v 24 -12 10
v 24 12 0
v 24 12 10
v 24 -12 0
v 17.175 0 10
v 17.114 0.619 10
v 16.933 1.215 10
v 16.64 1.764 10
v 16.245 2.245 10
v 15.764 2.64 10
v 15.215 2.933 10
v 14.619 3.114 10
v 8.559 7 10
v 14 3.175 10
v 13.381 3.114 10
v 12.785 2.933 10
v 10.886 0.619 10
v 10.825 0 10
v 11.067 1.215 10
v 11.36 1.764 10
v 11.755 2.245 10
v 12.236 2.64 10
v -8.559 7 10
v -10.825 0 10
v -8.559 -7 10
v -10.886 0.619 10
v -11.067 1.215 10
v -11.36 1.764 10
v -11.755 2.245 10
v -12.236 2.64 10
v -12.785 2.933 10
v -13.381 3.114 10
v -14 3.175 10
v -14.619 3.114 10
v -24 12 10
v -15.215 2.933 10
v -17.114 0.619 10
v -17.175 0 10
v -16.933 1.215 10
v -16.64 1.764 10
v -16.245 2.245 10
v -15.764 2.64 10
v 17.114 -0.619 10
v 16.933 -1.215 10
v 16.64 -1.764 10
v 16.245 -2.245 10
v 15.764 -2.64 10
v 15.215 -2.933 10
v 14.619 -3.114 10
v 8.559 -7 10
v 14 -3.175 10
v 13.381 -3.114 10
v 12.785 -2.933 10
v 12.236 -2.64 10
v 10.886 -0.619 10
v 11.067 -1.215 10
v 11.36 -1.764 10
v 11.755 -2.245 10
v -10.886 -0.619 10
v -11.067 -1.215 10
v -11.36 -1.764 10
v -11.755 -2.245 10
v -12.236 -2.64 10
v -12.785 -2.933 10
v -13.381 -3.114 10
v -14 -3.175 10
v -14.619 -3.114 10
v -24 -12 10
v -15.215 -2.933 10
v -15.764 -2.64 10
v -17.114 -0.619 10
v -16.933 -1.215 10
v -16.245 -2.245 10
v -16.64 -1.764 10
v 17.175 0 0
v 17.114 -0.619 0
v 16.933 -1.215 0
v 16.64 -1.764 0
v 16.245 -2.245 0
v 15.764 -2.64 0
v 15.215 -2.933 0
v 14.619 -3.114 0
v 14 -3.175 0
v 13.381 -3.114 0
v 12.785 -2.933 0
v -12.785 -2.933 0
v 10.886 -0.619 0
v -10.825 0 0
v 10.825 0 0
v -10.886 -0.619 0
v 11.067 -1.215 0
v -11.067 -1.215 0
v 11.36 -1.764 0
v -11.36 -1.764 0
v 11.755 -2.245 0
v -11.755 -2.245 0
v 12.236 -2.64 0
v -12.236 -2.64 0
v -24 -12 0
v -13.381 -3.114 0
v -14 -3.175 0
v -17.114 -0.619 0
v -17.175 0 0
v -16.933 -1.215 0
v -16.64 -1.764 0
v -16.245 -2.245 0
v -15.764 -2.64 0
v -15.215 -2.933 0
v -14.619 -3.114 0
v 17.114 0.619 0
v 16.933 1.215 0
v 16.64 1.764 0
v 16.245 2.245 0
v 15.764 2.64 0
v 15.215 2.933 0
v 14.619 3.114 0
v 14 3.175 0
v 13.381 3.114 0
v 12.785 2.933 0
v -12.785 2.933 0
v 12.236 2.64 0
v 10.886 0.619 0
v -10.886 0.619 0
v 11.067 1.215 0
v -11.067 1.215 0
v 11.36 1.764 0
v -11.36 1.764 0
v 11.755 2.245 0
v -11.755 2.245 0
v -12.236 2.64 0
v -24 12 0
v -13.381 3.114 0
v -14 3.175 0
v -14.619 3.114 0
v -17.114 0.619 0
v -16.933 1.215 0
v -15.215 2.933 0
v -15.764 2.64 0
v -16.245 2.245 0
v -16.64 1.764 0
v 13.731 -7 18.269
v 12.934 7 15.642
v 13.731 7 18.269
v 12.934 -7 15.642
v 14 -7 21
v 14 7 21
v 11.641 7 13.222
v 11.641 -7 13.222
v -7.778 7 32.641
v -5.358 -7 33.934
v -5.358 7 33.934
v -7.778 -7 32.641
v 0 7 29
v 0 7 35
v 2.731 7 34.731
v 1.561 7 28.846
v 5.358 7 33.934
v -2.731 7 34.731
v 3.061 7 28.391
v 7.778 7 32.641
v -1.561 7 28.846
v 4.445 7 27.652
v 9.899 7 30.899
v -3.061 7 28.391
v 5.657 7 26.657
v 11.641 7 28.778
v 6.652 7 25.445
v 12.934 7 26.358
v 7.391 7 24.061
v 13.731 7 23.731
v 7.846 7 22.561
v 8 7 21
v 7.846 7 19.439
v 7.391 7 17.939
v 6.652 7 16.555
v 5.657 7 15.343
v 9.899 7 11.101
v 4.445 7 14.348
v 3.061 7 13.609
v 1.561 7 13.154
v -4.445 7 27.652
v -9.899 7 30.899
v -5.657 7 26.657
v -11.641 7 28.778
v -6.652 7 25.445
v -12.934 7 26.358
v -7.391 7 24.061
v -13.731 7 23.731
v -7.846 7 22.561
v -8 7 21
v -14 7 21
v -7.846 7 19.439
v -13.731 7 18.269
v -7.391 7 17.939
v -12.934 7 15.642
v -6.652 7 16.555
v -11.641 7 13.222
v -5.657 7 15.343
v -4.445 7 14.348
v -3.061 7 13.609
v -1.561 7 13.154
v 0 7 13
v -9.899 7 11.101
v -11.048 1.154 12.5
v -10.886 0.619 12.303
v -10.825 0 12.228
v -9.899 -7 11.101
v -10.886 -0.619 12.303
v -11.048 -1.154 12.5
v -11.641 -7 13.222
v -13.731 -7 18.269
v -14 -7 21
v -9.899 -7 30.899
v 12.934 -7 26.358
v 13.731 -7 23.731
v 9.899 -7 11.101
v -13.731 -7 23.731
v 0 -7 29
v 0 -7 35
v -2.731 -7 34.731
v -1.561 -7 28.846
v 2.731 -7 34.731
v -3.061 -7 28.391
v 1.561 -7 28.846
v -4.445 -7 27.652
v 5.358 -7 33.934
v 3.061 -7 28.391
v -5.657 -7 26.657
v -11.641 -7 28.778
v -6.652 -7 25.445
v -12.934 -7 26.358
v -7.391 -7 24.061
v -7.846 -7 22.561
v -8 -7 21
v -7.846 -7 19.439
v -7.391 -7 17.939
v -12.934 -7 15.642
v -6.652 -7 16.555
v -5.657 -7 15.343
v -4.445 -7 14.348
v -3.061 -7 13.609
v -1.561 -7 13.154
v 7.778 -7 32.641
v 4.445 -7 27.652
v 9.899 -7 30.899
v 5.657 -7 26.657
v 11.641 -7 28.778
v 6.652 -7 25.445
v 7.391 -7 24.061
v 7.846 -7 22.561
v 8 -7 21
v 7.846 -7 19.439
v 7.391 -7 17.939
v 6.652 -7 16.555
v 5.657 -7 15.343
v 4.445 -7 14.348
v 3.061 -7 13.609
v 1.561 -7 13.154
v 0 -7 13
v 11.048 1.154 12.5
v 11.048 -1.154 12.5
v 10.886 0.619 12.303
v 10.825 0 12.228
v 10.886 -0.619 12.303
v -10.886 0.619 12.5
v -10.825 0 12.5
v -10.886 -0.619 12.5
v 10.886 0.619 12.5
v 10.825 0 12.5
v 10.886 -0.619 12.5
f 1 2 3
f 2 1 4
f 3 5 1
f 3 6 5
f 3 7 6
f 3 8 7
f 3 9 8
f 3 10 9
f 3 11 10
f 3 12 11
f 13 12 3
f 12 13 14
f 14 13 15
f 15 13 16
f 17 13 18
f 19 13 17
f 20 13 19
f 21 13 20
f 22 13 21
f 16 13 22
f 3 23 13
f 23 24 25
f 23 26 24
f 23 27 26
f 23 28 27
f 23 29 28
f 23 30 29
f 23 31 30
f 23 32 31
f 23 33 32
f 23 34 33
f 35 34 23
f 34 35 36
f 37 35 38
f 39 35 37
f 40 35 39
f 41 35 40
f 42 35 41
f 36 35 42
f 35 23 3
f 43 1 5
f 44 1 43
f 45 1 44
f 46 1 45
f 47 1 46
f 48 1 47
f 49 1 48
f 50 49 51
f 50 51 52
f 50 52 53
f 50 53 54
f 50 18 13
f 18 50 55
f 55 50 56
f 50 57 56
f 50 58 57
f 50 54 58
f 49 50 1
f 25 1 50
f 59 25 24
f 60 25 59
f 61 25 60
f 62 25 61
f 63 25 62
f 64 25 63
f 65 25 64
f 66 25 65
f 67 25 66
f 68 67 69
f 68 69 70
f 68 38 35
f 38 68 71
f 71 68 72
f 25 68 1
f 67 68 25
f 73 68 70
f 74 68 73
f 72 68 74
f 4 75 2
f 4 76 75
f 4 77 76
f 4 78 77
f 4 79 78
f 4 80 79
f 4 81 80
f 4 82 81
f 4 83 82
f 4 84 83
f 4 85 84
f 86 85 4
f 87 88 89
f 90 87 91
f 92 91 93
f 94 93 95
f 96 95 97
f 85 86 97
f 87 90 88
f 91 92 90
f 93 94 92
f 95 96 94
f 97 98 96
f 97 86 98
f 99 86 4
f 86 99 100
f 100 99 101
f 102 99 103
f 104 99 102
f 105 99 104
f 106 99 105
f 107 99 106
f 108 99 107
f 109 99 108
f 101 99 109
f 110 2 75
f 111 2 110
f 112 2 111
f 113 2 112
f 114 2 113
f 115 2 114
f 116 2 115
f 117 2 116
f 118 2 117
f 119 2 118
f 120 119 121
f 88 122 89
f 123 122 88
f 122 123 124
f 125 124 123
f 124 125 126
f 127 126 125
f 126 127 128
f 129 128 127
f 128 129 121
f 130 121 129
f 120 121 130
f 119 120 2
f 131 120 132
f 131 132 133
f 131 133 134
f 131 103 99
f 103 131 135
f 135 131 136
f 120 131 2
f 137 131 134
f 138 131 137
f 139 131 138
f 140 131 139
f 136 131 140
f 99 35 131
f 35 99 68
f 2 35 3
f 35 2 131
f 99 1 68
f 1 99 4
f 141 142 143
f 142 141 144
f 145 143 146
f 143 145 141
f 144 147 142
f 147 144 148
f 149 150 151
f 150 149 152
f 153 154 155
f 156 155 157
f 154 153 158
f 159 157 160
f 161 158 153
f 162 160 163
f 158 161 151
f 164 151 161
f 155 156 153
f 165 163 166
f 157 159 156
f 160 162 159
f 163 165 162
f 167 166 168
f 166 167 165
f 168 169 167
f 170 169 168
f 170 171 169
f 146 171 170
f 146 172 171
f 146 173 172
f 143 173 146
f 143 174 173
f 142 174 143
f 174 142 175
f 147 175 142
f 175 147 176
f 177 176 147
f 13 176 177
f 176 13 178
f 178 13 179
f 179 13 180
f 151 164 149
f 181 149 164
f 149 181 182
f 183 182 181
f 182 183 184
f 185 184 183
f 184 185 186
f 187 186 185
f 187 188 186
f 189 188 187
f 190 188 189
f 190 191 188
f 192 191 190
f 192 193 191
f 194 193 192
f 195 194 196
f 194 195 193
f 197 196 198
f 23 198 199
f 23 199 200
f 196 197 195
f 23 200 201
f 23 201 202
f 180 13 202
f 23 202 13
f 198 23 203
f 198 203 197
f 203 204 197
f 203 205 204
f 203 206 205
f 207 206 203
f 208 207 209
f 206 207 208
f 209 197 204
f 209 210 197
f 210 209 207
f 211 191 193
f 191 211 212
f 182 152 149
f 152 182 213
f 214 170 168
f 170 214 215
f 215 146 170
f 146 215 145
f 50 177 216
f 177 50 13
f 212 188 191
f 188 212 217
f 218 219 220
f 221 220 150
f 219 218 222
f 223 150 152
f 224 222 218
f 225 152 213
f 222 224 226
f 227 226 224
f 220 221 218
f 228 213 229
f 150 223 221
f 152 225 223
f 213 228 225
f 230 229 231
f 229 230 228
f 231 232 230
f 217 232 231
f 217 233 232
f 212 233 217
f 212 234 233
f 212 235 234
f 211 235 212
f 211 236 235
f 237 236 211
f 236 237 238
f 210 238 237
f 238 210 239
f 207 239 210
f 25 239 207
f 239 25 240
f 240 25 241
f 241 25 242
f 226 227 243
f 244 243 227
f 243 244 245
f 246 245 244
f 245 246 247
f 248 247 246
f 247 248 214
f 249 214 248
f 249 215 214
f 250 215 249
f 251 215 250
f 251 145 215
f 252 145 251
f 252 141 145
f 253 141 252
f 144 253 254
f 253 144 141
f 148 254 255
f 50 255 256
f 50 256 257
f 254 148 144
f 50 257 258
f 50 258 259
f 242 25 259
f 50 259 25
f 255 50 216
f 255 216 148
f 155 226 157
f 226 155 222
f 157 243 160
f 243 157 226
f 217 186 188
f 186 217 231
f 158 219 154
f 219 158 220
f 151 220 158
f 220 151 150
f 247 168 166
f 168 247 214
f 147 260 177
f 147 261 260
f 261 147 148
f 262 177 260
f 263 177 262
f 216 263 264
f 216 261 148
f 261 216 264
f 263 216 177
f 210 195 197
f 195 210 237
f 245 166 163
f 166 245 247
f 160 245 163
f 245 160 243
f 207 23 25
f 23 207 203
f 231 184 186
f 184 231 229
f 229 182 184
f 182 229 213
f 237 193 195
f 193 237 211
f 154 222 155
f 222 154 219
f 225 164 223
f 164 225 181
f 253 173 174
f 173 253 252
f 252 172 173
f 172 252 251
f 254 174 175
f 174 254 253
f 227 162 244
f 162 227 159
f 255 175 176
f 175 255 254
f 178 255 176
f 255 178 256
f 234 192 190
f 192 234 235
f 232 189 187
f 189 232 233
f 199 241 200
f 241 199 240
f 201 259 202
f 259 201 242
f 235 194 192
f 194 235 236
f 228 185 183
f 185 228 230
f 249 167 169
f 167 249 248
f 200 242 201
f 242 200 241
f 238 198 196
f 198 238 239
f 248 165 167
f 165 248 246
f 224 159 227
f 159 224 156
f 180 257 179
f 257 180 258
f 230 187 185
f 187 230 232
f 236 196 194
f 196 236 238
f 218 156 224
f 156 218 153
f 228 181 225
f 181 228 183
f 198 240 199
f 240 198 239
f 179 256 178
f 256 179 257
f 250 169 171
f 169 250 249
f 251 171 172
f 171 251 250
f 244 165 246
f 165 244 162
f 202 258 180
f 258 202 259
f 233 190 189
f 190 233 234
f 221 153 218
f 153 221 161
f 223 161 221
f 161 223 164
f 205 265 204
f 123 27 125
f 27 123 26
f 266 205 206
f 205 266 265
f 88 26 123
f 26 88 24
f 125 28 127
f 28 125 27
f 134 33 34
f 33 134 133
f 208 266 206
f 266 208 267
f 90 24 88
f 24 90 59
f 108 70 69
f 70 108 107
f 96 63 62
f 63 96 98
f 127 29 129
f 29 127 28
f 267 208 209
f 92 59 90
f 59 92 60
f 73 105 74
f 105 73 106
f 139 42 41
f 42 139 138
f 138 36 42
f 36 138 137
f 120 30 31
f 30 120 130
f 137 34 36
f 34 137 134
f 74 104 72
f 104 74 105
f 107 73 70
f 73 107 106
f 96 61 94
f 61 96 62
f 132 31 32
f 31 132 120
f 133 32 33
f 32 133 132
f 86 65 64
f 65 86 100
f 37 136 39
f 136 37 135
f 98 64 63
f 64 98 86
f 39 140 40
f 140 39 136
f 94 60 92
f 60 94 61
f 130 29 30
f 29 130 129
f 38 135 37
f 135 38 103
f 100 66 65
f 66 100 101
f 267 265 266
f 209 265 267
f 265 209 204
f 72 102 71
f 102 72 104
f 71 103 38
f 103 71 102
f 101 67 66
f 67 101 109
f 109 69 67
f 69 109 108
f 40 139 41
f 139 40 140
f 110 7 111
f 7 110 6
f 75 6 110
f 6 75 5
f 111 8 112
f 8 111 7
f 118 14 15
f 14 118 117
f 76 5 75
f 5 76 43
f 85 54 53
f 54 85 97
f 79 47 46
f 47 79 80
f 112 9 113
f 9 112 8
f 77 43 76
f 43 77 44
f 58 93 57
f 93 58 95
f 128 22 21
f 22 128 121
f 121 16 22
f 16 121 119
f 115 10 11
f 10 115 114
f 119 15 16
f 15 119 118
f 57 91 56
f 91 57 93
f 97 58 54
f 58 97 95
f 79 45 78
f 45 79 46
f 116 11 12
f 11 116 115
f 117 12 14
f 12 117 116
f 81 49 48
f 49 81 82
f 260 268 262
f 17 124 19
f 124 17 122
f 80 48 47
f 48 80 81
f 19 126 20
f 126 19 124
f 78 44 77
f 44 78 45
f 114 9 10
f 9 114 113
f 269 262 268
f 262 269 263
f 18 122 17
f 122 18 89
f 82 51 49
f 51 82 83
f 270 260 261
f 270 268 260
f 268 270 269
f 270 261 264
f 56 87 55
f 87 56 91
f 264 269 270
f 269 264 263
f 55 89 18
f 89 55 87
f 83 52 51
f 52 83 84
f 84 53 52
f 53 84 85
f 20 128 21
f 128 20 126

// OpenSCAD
$fn = 32;

// ----------------------------------------------------------------------
// Deck eye: 28 mm eye on a 48 mm base
// ----------------------------------------------------------------------

// --- parameters (mm) ---
base_l = 48;              // base length
base_w = 24;              // base width
base_t = 10;              // base thickness
eye_r = 14;               // eye outside radius
eye_bore = 16;            // eye bore diameter
eye_w = 14;               // eye thickness
eye_z = 21;               // eye centre height
holes_d = 6.35;           // fixing holes
hole_x = 14;              // fixing hole spacing

difference() {
  union() {
    translate([-24, -12, 0]) cube([base_l, base_w, base_t]);
    /* eye standing upright, its foot sunk 3 mm into the base */
    translate([0, -7, 21]) rotate([-90, 0, 0]) cylinder(h = 14, d = 28);
  }
  /* eye bore, 2.5 mm clear of both faces */
  translate([0, -9.5, 21]) rotate([-90, 0, 0]) cylinder(h = 19, d = 16);
  translate([-14, 0, -2.5]) cylinder(h = base_t + 5, d = holes_d);
  translate([14, 0, -2.5]) cylinder(h = base_t + 5, d = holes_d);
}
